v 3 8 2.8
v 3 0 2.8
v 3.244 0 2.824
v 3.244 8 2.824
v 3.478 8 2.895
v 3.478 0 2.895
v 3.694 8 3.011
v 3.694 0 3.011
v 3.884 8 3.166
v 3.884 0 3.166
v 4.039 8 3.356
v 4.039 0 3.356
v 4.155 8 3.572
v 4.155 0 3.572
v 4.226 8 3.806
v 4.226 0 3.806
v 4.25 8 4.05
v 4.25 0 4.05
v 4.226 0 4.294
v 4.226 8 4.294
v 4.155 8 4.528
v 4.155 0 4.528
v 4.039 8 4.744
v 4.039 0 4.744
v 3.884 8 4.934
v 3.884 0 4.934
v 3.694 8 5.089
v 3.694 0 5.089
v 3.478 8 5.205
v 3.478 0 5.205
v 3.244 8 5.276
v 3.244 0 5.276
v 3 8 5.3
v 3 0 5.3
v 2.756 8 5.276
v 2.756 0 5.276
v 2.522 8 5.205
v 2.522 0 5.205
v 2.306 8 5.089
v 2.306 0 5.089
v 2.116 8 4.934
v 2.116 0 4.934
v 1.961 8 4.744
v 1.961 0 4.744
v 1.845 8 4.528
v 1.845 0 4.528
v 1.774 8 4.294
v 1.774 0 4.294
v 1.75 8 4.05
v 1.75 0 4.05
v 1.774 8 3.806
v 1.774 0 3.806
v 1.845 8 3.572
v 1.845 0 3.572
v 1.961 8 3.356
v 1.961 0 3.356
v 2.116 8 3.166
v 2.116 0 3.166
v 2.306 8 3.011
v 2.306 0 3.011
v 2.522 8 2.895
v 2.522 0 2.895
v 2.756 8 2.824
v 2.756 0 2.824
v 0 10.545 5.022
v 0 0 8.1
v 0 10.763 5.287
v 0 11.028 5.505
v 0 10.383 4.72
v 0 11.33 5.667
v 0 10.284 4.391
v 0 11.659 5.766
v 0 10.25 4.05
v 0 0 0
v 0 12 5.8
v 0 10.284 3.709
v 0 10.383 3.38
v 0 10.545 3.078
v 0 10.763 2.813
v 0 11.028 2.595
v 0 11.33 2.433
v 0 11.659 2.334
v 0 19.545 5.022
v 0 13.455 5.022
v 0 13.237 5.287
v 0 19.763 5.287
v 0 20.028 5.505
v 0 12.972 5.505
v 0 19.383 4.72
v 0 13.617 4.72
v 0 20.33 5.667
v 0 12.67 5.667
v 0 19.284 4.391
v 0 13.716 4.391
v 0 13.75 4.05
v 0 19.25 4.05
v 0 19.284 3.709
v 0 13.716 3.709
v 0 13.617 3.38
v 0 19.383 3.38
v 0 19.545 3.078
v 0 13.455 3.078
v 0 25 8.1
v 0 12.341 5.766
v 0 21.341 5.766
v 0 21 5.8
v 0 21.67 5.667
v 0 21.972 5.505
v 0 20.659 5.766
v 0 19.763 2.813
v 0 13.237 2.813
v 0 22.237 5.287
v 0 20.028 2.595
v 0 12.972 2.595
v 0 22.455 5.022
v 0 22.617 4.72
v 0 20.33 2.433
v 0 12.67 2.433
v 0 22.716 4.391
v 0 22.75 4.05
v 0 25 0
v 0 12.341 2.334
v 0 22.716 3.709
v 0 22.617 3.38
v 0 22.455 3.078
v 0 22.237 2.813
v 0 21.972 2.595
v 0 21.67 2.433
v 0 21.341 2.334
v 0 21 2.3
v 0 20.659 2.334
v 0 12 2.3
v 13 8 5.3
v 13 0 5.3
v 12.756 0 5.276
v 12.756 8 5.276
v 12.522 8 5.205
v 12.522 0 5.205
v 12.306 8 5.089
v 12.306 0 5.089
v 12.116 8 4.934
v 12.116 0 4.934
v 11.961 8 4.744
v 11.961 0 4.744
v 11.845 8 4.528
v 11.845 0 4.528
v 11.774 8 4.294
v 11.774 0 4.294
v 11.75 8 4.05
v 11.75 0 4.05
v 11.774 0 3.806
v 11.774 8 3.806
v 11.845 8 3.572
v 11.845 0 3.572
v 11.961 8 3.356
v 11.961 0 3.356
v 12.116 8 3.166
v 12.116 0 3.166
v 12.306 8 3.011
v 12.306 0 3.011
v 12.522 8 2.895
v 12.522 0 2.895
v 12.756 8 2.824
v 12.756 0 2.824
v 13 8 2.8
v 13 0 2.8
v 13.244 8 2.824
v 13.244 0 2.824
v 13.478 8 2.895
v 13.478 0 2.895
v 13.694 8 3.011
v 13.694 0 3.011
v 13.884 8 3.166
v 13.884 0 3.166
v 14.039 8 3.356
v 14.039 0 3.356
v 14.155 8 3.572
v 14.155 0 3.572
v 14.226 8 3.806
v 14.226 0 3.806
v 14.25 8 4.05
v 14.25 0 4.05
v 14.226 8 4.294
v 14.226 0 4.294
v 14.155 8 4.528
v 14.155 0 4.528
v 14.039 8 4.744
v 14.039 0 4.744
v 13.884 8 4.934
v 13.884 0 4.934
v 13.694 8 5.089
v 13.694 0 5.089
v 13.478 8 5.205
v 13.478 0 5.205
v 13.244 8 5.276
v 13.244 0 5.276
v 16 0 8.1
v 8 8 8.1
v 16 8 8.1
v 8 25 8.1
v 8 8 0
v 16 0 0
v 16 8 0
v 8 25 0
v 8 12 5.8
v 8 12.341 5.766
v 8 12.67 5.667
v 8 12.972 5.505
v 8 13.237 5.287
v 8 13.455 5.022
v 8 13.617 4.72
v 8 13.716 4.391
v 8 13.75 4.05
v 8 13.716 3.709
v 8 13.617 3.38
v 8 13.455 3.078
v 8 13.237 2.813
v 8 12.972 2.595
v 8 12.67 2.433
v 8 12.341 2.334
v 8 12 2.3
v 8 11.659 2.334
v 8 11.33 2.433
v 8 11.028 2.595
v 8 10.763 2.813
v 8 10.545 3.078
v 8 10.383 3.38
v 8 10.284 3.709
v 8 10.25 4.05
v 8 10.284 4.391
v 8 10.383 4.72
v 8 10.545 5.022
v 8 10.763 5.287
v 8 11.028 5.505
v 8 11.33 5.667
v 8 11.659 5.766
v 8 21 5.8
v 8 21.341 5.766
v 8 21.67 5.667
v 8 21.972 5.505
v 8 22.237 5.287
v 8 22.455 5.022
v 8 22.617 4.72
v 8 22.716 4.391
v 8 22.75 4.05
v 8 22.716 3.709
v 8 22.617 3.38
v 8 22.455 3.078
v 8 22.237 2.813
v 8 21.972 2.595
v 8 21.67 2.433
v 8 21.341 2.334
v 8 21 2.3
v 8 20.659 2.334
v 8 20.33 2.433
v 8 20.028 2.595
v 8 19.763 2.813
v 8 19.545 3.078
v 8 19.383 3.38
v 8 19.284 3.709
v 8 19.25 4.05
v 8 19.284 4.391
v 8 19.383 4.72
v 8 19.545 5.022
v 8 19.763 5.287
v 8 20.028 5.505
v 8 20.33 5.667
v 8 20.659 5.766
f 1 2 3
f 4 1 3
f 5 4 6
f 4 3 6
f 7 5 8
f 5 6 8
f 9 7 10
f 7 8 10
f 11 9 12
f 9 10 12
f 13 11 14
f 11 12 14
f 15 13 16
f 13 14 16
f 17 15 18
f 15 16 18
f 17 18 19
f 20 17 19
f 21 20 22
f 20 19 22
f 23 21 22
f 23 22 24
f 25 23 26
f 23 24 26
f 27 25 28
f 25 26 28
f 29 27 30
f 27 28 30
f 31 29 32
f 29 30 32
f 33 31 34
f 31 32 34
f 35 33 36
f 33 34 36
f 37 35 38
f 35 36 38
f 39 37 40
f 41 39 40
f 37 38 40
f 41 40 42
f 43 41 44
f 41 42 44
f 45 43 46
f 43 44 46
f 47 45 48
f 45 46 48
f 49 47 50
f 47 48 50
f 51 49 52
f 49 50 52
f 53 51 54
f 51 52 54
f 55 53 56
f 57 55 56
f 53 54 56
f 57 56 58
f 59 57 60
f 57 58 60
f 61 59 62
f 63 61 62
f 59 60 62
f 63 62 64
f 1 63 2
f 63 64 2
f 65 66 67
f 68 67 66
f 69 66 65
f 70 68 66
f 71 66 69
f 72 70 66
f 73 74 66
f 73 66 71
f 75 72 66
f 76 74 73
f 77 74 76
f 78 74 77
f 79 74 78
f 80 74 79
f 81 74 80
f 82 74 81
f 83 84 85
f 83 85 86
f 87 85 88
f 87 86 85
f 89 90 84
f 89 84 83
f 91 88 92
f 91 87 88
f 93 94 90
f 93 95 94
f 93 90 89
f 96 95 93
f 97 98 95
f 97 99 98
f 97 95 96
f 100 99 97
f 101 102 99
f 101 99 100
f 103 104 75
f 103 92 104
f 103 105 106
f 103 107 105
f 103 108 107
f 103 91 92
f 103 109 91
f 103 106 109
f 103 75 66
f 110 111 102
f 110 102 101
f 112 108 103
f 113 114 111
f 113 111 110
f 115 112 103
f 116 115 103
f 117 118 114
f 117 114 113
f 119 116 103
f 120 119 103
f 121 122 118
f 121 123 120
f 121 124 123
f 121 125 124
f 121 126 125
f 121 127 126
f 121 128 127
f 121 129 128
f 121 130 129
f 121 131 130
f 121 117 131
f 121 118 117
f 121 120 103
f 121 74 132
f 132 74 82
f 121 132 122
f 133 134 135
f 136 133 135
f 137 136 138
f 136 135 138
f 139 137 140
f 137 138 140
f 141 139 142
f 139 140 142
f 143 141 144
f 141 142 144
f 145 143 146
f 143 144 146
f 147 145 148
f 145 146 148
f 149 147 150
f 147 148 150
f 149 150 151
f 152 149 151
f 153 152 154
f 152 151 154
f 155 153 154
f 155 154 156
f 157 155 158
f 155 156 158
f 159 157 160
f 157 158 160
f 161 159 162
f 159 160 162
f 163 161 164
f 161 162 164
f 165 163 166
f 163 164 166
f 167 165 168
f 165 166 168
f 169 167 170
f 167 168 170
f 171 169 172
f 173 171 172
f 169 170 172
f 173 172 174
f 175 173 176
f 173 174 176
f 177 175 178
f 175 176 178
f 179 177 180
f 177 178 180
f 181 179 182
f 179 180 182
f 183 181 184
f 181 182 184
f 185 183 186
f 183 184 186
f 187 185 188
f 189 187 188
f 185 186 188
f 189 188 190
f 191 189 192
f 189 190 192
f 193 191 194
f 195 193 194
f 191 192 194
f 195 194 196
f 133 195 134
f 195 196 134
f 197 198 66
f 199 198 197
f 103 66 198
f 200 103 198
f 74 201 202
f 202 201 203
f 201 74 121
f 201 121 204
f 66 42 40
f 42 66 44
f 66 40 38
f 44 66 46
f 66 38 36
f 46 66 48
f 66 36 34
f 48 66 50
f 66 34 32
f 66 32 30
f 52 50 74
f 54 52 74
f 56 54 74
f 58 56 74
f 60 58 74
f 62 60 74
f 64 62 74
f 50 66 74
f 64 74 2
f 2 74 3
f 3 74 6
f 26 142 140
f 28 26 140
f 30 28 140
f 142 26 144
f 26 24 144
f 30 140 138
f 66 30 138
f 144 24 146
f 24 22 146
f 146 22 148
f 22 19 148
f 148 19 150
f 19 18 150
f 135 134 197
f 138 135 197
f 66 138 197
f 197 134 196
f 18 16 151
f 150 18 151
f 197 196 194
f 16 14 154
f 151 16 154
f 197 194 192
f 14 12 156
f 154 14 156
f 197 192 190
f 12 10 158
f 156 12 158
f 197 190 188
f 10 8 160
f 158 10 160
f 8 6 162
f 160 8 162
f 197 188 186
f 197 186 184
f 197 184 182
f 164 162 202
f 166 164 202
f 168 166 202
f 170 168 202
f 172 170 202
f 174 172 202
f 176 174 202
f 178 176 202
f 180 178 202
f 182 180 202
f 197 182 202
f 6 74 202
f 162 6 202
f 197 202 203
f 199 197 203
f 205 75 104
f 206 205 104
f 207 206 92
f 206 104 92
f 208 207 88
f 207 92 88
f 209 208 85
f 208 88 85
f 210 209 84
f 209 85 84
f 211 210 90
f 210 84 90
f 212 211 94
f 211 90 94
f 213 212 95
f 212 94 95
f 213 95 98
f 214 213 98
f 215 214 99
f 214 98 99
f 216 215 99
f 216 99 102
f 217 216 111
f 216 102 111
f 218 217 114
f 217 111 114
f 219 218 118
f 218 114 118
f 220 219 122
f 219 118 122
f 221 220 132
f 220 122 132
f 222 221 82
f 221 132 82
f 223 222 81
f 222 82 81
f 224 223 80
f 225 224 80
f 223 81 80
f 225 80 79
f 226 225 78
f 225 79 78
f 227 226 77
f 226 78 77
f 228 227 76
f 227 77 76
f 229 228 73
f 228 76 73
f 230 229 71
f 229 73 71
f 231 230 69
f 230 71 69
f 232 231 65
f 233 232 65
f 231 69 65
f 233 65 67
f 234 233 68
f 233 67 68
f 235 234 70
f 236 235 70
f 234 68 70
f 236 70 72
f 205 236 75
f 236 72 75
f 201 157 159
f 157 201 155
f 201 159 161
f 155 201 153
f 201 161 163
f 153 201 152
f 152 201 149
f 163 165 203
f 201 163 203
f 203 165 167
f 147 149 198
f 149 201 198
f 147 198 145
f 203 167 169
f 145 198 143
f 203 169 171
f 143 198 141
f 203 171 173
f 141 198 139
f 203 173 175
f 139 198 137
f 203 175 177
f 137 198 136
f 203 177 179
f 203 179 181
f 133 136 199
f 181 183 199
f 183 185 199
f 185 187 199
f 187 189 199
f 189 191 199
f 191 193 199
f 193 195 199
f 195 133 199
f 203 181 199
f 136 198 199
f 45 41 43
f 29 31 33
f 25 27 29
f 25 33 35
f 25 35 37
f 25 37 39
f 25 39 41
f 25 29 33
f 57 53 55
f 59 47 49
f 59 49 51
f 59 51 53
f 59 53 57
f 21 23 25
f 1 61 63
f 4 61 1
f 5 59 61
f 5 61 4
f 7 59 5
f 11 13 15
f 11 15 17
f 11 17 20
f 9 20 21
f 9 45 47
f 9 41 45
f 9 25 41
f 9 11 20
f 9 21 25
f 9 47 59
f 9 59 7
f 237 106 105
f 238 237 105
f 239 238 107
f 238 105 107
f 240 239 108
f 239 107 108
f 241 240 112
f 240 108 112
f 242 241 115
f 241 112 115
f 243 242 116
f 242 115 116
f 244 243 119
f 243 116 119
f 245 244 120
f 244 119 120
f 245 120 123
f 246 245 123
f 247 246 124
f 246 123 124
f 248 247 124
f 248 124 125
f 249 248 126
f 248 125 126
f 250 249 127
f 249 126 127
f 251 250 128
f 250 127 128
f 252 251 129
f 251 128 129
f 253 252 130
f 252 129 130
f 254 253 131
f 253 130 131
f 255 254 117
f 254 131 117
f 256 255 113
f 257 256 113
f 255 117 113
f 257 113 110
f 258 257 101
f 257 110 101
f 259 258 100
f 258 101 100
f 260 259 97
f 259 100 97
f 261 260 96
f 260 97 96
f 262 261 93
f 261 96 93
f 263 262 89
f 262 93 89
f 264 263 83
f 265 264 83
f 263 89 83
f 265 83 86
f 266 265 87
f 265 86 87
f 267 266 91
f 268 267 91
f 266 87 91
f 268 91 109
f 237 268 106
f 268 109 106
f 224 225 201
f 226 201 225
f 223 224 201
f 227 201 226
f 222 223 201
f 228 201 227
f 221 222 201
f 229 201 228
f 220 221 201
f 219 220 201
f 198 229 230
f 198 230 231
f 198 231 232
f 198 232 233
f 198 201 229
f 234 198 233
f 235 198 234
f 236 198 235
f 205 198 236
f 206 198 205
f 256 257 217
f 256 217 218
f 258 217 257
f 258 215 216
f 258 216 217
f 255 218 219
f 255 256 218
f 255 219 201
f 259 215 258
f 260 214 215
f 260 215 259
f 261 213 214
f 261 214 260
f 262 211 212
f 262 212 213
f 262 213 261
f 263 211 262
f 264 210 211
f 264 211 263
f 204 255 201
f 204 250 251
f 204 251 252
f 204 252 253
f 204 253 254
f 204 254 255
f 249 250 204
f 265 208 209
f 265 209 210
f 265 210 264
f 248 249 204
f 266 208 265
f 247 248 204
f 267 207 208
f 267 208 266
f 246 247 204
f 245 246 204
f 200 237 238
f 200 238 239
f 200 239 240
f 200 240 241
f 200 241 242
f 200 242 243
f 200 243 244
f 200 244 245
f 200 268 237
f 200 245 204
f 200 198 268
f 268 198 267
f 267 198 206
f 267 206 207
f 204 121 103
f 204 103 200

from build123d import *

# Parameters (mm, degrees)
ESQUISSE1_W             = 16
ESQUISSE1_H             = 25
BOSS_EXTRU_1_DEPTH      = 8.1
ESQUISSE2_R             = 1.25
ENL_V_MAT_EXTRU_1_DEPTH = 8
ESQUISSE3_R             = 1.75
ENL_V_MAT_EXTRU_2_DEPTH = 8
ESQUISSE4_W             = 8
ESQUISSE4_H             = 17
ENL_V_MAT_EXTRU_3_DEPTH = 31.767027806


with BuildPart() as part:
    # Esquisse1 → Boss.-Extru.1 (new body)
    with BuildSketch(Plane.XY):
        with Locations((8, 12.5)):
            Rectangle(ESQUISSE1_W, ESQUISSE1_H)
    extrude(amount=BOSS_EXTRU_1_DEPTH)

    # Esquisse2 → Enlèv. mat.-Extru.1 (cut)
    with BuildSketch(Plane.XZ):
        with Locations(Location((3, 4.05, 0), (0, 0, 270))):
            Circle(ESQUISSE2_R)
        with Locations(Location((13, 4.05, 0), (0, 0, 90))):
            Circle(ESQUISSE2_R)
    extrude(amount=-ENL_V_MAT_EXTRU_1_DEPTH, mode=Mode.SUBTRACT)

    # Esquisse3 → Enlèv. mat.-Extru.2 (cut)
    with BuildSketch(Plane.ZY):
        with Locations((4.05, 21)):
            Circle(ESQUISSE3_R)
        with Locations((4.05, 12)):
            Circle(ESQUISSE3_R)
    extrude(amount=-ENL_V_MAT_EXTRU_2_DEPTH, mode=Mode.SUBTRACT)

    # Esquisse4 → Enlèv. mat.-Extru.3 (cut, through all)
    with BuildSketch(Plane.XY.offset(8.1)):
        with Locations((12, 16.5)):
            Rectangle(ESQUISSE4_W, ESQUISSE4_H)
    extrude(amount=-ENL_V_MAT_EXTRU_3_DEPTH, mode=Mode.SUBTRACT)


solid = part.part
